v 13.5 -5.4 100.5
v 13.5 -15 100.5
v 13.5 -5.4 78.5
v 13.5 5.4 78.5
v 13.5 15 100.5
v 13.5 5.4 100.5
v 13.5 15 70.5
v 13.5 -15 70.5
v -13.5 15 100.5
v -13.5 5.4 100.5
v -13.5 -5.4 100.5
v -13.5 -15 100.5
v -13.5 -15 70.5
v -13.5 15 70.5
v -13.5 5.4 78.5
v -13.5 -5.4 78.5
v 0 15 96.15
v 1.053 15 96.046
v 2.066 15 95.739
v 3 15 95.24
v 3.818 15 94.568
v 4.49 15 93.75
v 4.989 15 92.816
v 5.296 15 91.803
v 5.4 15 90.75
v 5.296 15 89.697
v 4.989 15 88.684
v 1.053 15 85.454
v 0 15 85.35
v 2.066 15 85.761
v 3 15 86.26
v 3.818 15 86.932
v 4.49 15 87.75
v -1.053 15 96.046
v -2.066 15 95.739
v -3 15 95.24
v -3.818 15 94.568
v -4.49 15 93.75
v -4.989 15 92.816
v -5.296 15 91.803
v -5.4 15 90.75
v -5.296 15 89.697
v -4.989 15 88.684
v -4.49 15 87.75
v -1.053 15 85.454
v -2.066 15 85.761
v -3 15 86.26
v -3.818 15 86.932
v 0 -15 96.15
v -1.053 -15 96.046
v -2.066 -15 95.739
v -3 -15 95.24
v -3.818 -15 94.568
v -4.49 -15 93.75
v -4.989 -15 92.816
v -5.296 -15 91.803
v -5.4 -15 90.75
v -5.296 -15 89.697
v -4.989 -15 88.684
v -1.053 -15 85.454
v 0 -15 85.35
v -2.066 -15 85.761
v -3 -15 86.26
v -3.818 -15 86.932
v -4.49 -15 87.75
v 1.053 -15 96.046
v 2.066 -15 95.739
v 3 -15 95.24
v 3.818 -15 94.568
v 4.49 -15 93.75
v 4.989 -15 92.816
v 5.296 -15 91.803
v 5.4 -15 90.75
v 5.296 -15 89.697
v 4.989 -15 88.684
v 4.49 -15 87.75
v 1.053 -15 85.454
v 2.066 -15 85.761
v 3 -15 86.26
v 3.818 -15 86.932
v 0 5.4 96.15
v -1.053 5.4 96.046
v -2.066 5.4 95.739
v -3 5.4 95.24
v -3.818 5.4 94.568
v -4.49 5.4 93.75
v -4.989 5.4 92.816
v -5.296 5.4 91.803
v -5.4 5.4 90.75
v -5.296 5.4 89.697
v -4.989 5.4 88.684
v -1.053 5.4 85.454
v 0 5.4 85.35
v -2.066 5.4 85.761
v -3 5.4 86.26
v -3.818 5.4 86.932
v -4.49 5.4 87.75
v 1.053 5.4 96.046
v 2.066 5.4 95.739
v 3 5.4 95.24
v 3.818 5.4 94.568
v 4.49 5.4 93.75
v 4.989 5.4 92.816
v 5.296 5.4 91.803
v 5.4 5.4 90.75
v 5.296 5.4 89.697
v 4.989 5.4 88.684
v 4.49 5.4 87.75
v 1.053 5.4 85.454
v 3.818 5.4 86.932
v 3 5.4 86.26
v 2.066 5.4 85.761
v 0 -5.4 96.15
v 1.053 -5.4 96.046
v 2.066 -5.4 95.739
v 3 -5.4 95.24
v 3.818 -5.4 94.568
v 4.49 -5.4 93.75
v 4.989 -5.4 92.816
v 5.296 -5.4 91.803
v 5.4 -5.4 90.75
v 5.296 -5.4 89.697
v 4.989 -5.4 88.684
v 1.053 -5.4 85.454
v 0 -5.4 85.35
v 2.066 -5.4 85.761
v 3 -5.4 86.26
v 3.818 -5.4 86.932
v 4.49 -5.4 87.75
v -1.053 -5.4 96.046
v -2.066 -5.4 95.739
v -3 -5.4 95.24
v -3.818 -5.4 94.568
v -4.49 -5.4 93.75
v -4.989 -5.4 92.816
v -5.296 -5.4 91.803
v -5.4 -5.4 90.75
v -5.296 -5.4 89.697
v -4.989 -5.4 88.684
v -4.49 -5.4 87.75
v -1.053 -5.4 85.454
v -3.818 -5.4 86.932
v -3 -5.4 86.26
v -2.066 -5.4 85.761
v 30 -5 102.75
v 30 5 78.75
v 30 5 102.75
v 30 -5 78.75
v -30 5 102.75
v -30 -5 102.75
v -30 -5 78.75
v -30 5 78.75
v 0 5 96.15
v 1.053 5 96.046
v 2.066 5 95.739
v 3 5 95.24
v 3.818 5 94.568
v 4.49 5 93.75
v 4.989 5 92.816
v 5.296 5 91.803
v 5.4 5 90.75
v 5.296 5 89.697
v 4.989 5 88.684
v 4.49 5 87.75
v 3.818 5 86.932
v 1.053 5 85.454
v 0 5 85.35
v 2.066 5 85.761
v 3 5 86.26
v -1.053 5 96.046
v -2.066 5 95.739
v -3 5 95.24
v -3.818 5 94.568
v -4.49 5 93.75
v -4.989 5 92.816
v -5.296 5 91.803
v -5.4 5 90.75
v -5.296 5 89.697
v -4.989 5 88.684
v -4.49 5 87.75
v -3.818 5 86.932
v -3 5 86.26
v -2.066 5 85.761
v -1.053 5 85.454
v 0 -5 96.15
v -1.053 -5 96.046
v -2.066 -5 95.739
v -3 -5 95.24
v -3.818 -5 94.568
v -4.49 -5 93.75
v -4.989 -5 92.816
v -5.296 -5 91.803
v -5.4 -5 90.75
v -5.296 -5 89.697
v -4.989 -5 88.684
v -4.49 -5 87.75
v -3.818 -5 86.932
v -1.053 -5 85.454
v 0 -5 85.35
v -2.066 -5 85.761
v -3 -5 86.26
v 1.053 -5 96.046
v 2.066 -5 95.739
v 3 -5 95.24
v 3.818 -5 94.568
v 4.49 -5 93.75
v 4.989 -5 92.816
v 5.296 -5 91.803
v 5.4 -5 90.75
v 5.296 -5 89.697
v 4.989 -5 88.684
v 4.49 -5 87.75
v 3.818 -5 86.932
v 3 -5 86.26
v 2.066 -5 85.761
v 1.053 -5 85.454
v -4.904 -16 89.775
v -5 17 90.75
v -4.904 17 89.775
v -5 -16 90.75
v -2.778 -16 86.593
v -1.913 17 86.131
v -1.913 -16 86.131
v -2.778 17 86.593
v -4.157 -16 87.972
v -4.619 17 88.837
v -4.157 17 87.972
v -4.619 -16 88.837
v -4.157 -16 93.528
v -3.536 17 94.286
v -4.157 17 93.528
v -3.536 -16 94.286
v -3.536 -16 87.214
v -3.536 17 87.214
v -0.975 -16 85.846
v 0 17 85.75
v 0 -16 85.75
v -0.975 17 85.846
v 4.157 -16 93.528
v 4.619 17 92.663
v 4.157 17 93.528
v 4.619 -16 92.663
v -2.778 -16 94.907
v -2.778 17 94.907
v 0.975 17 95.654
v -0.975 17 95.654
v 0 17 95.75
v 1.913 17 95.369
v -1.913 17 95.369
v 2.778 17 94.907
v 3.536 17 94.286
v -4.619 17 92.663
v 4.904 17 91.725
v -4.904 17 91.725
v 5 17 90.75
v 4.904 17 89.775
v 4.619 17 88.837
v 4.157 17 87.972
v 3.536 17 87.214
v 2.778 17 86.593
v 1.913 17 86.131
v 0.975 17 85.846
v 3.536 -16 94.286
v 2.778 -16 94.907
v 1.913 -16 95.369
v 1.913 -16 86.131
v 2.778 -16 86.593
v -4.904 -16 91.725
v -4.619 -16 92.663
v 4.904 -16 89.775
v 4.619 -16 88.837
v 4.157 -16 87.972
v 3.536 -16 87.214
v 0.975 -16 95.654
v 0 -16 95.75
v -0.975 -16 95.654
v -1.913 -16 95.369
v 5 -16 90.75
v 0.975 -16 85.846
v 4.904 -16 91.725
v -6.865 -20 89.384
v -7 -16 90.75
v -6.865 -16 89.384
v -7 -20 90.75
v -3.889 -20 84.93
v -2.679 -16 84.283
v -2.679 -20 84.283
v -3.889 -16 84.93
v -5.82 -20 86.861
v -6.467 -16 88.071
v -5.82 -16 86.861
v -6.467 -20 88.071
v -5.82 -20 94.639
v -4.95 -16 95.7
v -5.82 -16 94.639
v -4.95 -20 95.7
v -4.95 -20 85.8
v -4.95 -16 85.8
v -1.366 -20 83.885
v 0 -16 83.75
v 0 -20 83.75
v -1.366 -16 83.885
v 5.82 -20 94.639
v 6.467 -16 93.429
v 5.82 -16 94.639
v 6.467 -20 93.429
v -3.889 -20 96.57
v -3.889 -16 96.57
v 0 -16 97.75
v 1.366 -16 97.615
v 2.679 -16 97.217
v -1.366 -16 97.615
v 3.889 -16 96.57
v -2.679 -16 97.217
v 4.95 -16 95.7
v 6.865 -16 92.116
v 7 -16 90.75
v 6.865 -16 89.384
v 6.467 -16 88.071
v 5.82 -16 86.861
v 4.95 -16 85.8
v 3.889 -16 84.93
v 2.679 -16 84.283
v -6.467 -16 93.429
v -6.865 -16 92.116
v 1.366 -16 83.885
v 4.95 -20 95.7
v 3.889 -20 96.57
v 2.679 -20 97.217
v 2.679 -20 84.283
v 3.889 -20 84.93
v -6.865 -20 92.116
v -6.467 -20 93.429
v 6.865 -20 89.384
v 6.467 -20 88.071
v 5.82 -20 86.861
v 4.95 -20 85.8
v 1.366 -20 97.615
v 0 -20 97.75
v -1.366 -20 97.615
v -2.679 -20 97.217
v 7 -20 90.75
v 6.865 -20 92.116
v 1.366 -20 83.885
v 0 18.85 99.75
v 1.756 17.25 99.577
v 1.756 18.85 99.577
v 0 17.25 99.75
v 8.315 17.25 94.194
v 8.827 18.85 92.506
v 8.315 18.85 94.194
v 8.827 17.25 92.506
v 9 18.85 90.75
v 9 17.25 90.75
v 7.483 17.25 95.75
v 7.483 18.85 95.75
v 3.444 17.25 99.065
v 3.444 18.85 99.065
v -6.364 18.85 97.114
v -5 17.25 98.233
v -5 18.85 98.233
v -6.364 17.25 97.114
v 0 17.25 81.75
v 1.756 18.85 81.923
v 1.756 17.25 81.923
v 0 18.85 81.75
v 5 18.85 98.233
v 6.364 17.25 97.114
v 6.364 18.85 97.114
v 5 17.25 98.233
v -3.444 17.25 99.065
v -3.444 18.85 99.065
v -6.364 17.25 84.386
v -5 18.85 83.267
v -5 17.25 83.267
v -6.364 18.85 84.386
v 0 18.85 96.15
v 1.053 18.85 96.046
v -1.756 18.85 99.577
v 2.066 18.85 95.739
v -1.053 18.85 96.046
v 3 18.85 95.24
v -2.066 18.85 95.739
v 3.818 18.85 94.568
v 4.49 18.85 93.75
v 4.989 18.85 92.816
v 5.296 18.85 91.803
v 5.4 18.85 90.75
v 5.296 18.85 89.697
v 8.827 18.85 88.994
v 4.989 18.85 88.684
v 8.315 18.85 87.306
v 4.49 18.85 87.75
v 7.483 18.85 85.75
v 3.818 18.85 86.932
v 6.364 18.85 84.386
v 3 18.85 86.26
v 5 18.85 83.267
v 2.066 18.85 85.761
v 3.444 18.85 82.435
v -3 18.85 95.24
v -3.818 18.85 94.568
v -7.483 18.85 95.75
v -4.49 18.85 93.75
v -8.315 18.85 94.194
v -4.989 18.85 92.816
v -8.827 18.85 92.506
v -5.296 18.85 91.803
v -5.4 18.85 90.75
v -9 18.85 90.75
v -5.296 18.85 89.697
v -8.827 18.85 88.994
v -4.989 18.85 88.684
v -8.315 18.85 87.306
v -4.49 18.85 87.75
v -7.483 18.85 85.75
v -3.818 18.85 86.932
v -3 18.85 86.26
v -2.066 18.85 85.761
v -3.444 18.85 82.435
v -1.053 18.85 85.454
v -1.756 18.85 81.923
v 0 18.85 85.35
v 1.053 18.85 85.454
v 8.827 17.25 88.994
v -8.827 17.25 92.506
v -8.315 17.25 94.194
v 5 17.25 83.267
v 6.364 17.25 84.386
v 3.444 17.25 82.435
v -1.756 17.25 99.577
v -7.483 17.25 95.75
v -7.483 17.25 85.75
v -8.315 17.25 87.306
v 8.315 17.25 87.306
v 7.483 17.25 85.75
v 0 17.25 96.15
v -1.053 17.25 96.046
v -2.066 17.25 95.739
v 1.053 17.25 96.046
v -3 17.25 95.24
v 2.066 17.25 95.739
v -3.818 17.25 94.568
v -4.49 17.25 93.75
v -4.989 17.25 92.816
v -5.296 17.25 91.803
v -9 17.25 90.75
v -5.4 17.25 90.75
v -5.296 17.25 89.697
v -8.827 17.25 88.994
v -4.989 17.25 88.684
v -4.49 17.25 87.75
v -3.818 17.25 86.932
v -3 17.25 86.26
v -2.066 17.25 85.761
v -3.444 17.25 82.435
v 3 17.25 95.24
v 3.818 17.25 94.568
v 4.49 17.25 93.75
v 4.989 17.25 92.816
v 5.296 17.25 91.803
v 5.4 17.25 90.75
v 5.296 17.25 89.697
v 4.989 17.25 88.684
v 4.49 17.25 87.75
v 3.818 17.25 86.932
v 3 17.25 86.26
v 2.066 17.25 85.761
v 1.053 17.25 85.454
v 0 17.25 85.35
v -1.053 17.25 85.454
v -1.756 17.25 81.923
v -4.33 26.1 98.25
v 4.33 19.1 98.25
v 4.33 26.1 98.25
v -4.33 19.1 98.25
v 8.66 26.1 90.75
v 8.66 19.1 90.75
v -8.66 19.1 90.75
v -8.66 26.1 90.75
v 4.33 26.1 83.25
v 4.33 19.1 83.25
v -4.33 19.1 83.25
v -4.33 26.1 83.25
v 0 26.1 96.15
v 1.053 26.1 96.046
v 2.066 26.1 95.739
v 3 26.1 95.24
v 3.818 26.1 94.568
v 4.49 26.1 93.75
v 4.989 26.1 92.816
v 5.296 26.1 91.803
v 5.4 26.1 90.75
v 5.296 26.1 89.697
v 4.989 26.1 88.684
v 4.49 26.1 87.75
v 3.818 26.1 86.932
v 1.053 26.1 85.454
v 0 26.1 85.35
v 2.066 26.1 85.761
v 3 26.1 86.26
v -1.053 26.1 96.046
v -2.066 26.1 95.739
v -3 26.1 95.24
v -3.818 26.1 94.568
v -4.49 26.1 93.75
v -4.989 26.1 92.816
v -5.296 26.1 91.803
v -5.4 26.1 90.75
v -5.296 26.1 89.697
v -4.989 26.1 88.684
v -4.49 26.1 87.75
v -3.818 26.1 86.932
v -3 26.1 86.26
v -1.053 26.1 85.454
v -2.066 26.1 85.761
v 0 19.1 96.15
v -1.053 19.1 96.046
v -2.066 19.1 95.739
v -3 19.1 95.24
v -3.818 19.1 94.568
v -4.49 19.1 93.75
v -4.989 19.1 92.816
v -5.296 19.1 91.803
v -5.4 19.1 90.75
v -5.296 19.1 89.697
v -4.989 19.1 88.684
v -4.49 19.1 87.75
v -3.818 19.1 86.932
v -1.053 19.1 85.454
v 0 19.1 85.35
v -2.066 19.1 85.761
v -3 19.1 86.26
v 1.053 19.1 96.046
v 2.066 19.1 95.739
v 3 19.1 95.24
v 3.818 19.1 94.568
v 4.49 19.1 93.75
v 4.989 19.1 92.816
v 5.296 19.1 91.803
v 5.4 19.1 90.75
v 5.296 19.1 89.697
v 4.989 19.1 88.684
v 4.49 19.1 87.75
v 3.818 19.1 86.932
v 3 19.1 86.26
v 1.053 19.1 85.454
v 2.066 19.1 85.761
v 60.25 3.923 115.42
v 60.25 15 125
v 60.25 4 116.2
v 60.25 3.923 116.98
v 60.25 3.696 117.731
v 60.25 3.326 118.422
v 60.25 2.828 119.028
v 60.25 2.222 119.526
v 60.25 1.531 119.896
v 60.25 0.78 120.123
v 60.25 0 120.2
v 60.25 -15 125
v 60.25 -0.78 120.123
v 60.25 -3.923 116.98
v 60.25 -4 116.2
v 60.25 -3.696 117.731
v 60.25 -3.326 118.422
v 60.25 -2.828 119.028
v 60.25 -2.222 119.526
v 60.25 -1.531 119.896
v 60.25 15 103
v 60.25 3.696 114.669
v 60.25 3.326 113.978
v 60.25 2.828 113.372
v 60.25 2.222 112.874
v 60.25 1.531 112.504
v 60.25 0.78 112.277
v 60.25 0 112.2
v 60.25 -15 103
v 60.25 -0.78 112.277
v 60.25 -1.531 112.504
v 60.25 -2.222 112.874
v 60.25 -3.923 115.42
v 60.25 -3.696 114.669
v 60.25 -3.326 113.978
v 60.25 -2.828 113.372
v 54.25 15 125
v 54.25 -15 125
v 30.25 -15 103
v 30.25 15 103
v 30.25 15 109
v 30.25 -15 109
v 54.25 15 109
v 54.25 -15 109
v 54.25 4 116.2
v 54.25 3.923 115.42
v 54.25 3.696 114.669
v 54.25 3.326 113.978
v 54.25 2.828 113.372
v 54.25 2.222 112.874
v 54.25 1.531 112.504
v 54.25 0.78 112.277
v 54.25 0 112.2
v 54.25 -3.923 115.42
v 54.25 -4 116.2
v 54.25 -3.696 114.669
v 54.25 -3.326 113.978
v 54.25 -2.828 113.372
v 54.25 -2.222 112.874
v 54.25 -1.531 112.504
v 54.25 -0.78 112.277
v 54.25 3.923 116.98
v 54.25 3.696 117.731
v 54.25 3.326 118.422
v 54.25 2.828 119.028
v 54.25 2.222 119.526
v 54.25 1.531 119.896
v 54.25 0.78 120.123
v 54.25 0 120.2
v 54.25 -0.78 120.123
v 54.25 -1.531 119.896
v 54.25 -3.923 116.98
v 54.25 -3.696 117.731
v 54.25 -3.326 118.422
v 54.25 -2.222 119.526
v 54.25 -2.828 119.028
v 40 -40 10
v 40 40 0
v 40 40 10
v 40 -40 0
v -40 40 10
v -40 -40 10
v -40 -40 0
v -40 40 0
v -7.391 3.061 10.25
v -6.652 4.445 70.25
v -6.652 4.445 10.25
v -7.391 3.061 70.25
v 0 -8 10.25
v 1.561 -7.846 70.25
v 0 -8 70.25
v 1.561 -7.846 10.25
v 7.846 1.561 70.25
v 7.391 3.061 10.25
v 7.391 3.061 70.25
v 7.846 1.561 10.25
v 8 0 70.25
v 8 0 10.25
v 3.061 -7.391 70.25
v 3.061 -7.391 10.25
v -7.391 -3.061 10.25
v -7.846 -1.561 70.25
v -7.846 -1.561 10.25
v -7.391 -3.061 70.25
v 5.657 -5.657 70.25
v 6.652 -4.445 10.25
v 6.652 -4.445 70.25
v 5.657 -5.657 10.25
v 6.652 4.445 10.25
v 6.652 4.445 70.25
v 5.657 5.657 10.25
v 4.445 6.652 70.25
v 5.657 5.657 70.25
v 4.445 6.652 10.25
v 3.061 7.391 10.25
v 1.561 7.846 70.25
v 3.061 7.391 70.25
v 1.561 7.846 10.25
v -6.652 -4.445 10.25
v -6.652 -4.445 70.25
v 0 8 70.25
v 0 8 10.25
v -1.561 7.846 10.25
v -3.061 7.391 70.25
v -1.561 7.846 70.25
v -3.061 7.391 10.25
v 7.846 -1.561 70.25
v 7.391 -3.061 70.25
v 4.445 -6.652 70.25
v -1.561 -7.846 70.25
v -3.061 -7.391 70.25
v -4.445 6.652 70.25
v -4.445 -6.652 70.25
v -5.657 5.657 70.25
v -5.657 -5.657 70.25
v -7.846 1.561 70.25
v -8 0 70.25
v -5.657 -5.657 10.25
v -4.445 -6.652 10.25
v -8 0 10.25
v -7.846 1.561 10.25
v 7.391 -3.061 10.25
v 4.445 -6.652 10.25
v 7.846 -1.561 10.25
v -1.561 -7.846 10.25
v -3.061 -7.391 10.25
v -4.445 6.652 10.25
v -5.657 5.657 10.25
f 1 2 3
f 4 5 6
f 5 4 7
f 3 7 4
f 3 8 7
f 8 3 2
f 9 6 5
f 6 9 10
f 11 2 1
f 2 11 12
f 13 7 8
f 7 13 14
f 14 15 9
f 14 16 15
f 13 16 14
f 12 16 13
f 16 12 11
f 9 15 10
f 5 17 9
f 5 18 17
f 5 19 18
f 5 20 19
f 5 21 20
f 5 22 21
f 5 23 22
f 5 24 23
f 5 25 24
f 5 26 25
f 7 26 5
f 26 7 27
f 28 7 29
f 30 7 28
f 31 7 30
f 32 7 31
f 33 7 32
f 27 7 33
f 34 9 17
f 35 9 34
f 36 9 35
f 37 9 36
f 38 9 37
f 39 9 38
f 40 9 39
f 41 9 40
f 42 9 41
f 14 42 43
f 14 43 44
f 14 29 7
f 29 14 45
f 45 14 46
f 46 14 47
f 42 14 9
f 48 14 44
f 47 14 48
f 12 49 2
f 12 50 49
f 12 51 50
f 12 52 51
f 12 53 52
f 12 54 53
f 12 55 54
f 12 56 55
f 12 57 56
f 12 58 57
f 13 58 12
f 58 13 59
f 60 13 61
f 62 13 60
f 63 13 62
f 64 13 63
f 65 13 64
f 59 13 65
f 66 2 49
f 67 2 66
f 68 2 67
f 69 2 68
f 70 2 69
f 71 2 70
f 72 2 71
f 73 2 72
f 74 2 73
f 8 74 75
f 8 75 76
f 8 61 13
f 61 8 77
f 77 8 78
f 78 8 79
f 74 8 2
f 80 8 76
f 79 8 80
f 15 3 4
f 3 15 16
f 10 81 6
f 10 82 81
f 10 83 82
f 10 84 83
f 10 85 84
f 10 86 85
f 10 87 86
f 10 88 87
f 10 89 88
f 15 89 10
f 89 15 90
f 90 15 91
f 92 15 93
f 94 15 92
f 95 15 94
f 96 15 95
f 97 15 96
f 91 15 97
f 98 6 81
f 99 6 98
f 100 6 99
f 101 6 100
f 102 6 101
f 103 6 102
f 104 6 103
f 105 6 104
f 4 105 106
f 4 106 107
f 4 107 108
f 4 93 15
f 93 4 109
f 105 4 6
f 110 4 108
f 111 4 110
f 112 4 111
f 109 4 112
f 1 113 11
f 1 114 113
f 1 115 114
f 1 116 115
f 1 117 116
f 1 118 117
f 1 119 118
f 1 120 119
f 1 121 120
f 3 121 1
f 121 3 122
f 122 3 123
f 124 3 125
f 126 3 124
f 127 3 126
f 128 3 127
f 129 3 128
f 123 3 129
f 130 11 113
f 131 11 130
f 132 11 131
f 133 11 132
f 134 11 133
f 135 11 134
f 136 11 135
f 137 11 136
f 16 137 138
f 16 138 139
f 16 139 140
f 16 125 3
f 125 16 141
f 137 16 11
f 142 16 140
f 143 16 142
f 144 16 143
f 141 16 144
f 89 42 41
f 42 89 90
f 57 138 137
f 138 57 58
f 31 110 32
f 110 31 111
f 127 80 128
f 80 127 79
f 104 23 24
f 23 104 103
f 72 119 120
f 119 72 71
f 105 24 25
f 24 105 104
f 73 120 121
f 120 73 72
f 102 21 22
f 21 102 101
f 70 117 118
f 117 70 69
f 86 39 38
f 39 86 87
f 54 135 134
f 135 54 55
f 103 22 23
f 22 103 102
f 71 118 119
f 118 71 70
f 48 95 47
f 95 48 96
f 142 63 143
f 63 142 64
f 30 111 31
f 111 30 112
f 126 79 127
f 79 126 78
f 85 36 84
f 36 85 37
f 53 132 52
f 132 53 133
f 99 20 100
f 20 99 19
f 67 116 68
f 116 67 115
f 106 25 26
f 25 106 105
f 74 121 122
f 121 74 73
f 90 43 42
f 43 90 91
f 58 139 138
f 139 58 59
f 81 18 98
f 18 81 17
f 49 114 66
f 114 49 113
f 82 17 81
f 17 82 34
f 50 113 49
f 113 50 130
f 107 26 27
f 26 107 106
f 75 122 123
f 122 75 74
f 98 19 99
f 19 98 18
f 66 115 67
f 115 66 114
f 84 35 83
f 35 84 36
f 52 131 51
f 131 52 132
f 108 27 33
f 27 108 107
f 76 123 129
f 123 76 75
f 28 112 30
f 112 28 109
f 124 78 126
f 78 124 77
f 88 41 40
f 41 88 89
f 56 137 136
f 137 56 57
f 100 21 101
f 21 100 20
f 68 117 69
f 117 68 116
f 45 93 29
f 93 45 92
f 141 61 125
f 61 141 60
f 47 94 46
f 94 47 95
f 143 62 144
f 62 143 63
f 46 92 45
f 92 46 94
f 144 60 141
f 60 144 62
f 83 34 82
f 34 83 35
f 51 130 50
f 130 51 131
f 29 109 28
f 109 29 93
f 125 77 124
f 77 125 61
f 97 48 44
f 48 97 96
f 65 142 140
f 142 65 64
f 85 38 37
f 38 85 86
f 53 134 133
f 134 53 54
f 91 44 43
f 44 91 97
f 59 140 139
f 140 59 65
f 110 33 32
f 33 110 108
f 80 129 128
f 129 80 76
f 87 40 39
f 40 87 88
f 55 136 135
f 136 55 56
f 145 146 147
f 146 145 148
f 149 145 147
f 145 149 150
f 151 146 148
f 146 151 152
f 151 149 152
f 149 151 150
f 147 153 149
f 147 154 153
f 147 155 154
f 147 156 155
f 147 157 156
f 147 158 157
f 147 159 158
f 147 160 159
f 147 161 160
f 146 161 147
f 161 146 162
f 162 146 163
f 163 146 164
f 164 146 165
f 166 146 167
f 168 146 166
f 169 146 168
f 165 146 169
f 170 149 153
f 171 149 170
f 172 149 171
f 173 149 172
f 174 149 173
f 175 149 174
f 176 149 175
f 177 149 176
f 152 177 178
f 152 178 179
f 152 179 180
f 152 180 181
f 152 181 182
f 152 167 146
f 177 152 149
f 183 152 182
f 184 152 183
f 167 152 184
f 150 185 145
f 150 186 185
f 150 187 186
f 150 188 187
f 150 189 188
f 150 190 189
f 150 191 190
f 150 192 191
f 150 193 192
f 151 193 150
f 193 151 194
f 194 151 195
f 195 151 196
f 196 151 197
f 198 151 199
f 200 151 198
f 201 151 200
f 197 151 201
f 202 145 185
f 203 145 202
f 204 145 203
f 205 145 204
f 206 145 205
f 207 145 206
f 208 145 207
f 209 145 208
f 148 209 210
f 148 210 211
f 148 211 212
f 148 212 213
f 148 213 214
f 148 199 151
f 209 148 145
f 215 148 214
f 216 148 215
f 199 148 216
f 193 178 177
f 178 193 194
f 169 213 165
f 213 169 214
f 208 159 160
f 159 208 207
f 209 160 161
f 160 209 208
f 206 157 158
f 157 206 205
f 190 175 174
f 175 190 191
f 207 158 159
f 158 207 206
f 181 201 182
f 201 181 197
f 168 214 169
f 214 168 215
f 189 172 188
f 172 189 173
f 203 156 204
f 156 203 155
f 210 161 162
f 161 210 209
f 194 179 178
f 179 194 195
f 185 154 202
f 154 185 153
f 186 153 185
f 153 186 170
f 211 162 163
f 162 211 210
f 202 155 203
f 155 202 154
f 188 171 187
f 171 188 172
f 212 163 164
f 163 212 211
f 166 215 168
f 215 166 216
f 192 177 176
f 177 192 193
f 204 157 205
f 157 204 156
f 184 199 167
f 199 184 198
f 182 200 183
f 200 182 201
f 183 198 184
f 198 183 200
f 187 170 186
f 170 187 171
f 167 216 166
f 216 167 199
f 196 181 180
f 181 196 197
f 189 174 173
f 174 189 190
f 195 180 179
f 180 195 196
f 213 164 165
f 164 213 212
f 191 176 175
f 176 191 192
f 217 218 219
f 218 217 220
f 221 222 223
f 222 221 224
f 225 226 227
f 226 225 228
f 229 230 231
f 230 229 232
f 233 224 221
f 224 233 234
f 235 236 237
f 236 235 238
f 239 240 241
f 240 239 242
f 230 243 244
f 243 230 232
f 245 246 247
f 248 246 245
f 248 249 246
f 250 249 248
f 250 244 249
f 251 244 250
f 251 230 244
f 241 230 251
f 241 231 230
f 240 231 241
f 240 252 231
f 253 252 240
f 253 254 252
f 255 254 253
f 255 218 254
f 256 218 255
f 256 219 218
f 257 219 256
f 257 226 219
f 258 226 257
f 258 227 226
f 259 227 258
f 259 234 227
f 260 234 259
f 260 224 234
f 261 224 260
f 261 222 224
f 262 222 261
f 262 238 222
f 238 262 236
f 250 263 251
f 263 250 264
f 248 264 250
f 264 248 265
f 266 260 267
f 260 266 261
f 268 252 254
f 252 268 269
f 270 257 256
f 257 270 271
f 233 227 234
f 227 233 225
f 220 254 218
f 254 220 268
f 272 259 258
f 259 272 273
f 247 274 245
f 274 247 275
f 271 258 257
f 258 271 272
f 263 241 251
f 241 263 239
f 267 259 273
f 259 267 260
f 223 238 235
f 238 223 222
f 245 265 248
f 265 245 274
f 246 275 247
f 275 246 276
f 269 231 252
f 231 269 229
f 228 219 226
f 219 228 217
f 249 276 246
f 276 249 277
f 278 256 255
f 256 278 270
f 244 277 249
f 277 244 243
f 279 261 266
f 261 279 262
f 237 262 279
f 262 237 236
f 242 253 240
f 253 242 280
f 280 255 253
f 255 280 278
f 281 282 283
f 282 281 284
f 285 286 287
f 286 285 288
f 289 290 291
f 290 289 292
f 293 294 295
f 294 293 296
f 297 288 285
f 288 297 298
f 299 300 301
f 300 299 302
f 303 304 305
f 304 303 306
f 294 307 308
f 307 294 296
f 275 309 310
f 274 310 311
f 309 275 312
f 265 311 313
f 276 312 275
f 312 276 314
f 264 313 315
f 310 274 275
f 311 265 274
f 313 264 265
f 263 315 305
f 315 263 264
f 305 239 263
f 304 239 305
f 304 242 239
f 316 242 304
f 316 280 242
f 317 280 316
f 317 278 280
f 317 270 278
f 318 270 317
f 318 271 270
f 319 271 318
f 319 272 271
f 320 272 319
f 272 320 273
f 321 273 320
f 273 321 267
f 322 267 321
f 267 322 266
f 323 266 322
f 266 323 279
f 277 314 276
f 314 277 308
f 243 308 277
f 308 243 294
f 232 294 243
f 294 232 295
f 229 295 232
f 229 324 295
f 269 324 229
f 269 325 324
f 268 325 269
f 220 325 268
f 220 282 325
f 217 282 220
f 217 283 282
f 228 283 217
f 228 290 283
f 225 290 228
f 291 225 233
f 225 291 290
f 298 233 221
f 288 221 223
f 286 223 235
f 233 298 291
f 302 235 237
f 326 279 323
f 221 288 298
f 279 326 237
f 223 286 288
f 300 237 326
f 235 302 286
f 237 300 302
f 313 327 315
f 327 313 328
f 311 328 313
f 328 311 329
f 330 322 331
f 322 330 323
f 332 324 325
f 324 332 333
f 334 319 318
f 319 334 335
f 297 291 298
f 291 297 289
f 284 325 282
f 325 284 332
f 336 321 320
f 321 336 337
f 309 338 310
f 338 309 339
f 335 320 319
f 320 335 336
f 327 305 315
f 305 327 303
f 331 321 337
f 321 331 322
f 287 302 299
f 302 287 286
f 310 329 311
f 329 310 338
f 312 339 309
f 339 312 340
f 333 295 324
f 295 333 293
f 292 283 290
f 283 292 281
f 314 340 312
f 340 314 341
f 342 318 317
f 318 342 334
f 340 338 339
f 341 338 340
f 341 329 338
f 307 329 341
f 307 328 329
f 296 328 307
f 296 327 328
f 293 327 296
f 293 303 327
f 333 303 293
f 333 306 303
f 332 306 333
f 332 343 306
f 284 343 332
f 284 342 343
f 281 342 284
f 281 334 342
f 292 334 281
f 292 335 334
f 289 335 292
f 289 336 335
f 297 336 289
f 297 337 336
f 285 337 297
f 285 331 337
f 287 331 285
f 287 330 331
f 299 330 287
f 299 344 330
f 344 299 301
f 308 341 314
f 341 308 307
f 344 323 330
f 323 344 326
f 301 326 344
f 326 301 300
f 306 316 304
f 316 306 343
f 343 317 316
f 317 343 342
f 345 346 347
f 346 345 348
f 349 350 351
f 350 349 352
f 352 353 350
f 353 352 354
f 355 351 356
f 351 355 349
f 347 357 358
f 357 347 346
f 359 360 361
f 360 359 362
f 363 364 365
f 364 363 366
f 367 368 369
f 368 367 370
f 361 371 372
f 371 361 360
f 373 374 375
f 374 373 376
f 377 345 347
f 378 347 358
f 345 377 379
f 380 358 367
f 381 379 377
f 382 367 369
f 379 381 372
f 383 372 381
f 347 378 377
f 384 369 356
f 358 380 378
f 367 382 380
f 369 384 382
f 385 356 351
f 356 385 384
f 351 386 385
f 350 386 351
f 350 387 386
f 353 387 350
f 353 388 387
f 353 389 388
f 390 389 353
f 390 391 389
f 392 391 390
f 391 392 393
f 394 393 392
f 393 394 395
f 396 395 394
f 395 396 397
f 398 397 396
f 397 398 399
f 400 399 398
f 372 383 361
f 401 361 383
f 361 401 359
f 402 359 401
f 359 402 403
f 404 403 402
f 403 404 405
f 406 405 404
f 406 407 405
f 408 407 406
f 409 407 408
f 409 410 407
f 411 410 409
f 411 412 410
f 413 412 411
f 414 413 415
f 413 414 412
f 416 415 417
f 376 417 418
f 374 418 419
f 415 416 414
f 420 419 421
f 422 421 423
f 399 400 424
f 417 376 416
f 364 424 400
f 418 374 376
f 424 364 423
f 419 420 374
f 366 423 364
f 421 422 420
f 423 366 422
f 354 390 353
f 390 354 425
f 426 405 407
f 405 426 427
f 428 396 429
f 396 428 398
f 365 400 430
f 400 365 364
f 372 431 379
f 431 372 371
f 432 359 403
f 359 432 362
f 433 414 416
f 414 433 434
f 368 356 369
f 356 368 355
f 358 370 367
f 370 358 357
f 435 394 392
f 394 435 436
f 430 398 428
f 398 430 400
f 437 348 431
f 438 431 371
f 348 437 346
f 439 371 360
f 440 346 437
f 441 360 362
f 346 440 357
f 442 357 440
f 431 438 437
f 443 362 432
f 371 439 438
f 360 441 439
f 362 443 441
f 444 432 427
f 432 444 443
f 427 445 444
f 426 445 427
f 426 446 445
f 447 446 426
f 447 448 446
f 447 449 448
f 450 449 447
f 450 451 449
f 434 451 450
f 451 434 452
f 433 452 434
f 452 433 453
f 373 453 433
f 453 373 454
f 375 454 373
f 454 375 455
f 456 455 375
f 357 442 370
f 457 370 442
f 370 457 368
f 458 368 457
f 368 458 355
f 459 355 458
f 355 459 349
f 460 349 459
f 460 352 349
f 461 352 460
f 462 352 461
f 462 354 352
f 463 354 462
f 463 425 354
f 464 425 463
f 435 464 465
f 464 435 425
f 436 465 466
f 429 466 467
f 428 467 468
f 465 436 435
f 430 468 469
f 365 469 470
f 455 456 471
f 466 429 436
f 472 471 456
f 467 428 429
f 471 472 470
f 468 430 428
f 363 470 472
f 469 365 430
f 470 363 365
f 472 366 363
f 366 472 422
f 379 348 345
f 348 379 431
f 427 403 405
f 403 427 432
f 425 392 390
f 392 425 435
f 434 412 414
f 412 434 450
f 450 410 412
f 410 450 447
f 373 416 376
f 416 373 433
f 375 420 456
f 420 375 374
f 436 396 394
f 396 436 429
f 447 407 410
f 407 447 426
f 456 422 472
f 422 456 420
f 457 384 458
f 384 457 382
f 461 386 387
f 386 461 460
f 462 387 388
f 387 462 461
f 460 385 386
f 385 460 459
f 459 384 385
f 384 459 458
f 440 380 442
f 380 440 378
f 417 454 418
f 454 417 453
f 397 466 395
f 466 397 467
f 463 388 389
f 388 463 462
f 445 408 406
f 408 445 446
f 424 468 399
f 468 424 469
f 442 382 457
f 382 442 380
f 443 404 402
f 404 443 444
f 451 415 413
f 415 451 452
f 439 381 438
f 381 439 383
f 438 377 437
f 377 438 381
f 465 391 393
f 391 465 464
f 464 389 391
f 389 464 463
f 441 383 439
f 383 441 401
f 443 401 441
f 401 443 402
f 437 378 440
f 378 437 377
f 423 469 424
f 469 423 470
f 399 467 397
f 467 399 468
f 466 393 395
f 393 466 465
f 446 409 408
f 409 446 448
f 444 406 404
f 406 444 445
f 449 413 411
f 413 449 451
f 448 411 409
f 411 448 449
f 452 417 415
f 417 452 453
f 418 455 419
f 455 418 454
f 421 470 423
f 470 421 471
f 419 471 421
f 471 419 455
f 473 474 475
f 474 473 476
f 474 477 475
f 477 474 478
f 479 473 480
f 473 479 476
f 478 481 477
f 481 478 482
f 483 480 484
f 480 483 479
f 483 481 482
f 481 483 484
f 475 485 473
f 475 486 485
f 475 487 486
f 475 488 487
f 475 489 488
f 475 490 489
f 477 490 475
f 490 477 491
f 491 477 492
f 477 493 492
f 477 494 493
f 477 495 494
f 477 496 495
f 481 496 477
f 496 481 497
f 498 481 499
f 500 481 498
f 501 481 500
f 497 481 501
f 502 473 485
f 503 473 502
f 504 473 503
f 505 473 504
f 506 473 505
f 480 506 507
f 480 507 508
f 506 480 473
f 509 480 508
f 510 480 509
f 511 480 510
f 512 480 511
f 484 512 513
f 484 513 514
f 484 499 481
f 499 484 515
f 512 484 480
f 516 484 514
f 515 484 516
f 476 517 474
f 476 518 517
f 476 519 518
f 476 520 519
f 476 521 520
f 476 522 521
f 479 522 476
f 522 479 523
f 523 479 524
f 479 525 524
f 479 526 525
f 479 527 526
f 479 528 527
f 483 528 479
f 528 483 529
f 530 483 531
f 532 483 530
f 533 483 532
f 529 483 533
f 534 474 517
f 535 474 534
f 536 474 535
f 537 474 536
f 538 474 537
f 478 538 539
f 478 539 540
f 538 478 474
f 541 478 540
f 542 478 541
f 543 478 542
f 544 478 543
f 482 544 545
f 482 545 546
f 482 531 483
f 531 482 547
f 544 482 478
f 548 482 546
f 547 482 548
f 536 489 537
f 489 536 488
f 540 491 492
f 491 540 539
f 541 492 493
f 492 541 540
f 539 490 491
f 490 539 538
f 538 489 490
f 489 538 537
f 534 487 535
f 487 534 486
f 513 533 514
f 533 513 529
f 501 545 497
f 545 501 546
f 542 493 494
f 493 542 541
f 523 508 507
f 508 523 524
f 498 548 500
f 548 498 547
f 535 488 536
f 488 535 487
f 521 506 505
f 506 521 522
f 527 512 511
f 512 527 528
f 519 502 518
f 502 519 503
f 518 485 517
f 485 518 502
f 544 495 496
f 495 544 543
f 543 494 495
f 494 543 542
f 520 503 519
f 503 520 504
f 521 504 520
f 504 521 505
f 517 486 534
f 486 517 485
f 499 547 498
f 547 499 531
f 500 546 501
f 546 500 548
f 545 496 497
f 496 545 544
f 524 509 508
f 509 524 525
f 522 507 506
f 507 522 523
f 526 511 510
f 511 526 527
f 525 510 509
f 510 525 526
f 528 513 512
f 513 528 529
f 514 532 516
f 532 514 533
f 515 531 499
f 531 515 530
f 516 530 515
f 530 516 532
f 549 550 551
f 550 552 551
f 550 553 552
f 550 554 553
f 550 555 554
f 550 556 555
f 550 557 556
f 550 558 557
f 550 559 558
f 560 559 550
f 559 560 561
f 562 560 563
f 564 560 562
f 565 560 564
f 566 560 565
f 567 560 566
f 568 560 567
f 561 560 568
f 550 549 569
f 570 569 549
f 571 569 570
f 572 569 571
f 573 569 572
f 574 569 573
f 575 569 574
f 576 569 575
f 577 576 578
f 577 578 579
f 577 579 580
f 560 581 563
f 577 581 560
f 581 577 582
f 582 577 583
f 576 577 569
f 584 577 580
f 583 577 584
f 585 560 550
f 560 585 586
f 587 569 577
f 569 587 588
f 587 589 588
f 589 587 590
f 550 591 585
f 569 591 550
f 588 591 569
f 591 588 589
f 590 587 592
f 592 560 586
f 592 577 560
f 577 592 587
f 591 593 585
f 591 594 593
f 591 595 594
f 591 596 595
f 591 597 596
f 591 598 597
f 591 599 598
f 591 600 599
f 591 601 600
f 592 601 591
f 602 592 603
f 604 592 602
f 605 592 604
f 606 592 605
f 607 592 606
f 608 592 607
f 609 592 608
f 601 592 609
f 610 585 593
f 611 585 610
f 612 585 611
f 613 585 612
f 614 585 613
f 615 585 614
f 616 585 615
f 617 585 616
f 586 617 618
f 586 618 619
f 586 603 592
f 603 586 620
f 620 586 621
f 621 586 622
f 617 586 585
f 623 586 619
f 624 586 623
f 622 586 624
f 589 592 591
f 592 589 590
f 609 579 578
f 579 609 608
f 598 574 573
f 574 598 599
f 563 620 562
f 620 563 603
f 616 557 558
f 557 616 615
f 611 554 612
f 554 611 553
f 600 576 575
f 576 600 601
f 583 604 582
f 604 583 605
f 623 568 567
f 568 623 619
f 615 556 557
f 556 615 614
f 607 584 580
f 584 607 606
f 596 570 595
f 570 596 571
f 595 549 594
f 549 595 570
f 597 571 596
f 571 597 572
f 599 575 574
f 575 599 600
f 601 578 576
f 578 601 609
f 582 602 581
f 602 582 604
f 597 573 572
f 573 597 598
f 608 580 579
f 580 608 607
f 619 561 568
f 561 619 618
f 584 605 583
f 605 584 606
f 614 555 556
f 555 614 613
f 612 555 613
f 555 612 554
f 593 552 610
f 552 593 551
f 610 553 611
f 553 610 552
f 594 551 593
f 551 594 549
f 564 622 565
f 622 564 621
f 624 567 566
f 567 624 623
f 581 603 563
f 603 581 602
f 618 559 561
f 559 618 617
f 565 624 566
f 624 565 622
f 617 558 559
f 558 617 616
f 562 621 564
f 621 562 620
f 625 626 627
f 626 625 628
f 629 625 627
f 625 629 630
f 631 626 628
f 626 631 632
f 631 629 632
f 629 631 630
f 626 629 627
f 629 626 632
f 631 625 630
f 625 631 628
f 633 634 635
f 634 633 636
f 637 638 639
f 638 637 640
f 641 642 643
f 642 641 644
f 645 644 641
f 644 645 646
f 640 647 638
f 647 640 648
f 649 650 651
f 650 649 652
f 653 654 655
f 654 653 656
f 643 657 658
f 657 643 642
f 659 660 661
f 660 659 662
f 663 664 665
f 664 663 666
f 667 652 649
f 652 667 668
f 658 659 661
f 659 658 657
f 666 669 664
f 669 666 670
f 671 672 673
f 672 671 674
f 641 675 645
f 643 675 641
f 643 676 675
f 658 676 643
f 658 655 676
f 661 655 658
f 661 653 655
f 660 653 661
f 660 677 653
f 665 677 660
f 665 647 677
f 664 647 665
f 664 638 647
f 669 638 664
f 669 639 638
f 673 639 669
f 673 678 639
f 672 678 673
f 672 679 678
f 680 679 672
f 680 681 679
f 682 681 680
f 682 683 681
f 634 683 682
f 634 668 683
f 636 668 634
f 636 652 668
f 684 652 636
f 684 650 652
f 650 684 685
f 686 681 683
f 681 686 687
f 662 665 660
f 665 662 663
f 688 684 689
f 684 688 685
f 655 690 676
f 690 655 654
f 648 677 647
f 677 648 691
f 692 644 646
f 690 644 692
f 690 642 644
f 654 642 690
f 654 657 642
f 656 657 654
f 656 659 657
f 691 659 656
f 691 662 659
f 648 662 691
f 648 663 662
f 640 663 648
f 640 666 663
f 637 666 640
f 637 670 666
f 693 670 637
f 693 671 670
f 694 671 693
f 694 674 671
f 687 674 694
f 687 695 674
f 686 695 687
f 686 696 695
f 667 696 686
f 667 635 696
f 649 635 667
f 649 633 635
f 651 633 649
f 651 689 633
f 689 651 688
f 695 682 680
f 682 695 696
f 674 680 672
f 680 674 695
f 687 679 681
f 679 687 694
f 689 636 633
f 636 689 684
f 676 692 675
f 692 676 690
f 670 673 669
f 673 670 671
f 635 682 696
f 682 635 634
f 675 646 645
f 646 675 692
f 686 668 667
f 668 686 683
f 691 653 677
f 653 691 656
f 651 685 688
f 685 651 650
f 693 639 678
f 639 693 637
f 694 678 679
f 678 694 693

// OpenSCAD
$fn = 32;

// ------------------------------------------------------------------------
// Lamp arm: column d16 x 60 mm, arm 60 mm
// Every part is its own module, assembly() places every instance.
// ------------------------------------------------------------------------

// --- part 1 ---
module lamp_base() {
  difference() {
    translate([-40, -40, 0]) cube([80, 80, 10]);
  }
}

// --- part 2 ---
module lamp_column() {
  cylinder(h = 60, d = 16);
}

// --- part 3 ---
module head_fork() {
  difference() {
    translate([-13.5, -15, 0]) cube([27, 30, 30]);
    translate([-14.5, -5.4, 8]) cube([29, 10.8, 23]);
    translate([0, 0, 20.25]) rotate([90, 0, 0]) cylinder(h = 32, d = 10.8, center = true);
  }
}

// --- part 4 ---
module lamp_arm() {
  difference() {
    translate([-30, -5, 0]) cube([60, 10, 24]);
    translate([0, 0, 12]) rotate([90, 0, 0]) cylinder(h = 12, d = 10.8, center = true);
  }
}

// --- part 5 ---
module arm_pin() {
  rotate([0, 90, 0]) cylinder(h = 34, d = 10, center = true);
  translate([-20, 0, 0]) rotate([0, 90, 0]) cylinder(h = 4, d = 14);
}

// --- part 6 ---
module arm_washer() {
  difference() {
      translate([0, 0, 0]) cylinder(h = 1.6, d = 18);
      translate([0, 0, -1]) cylinder(h = 3.6, d = 10.8);
    }
}

// --- part 7 ---
module arm_nut() {
  difference() {
    linear_extrude(height = 7) polygon(points = [[8.66, 0], [4.33, 7.5], [-4.33, 7.5], [-8.66, 0], [-4.33, -7.5], [4.33, -7.5]]);
    translate([0, 0, -1]) cylinder(h = 9, d = 10.8);
  }
}

// --- part 8 ---
module shade_bracket() {
  difference() {
    translate([-15, -15, 0]) cube([30, 30, 22]);
    translate([-16, -16, 6]) cube([25, 32, 17]);
    translate([12, 0, 13.2]) rotate([0, 90, 0]) cylinder(h = 8, d = 8, center = true);
  }
}

// --- assembly ---
module assembly() {
  color([0.80, 0.24, 0.20]) translate([0, 0, 0]) rotate([0, 0, 0]) lamp_base();
  color([0.20, 0.45, 0.75]) translate([0, 0, 10.25]) rotate([0, 0, 0]) lamp_column();
  color([0.25, 0.62, 0.32]) translate([0, 0, 70.5]) rotate([0, 0, 0]) head_fork();
  color([0.92, 0.70, 0.18]) translate([0, 0, 78.75]) rotate([0, 0, 0]) lamp_arm();
  color([0.58, 0.35, 0.70]) translate([0, 0, 90.75]) rotate([0, 0, 90]) arm_pin();
  color([0.16, 0.66, 0.66]) translate([0, 18.85, 90.75]) rotate([90, 0, 0]) arm_washer();
  color([0.85, 0.48, 0.18]) translate([0, 26.1, 90.75]) rotate([90, 0, 0]) arm_nut();
  color([0.55, 0.60, 0.65]) translate([45.25, 0, 103]) rotate([0, 0, 0]) shade_bracket();
}

assembly();
